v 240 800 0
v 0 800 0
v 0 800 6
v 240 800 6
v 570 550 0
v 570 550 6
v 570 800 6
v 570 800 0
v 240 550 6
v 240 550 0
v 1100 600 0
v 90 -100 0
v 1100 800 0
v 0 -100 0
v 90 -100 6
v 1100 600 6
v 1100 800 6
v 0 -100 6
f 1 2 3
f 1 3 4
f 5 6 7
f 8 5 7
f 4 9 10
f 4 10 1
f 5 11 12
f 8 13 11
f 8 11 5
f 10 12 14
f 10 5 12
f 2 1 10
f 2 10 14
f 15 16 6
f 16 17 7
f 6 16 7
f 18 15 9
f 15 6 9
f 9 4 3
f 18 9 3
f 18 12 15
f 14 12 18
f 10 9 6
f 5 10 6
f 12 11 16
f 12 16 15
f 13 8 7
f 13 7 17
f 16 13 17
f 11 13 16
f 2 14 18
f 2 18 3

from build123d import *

# Parameters (mm, degrees)
EXTRUDE_1_DEPTH     = 6
SKETCH_2_W          = 250
SKETCH_2_H          = 250
CUT_EXTRUDE_1_DEPTH = 1361.160284672
SKETCH_3_W          = 80
SKETCH_3_H          = 250
CUT_EXTRUDE_2_DEPTH = 10


with BuildPart() as part:
    # 草图1 → 凸台-拉伸1 (new body)
    with BuildSketch(Plane.XY):
        Polygon((0, -100), (0, 800), (1100, 800), (1100, 600), (90, -100), align=None)
    extrude(amount=EXTRUDE_1_DEPTH)

    # 草图2 → 切除-拉伸1 (cut, through all)
    with BuildSketch(Plane.XY.offset(6)):
        with Locations((365, 675)):
            Rectangle(SKETCH_2_W, SKETCH_2_H)
    extrude(amount=-CUT_EXTRUDE_1_DEPTH, mode=Mode.SUBTRACT)

    # 草图3 → 切除-拉伸2 (cut)
    with BuildSketch(Plane.XY.offset(6)):
        with Locations((530, 675)):
            Rectangle(SKETCH_3_W, SKETCH_3_H)
    extrude(amount=-CUT_EXTRUDE_2_DEPTH, mode=Mode.SUBTRACT)


solid = part.part
